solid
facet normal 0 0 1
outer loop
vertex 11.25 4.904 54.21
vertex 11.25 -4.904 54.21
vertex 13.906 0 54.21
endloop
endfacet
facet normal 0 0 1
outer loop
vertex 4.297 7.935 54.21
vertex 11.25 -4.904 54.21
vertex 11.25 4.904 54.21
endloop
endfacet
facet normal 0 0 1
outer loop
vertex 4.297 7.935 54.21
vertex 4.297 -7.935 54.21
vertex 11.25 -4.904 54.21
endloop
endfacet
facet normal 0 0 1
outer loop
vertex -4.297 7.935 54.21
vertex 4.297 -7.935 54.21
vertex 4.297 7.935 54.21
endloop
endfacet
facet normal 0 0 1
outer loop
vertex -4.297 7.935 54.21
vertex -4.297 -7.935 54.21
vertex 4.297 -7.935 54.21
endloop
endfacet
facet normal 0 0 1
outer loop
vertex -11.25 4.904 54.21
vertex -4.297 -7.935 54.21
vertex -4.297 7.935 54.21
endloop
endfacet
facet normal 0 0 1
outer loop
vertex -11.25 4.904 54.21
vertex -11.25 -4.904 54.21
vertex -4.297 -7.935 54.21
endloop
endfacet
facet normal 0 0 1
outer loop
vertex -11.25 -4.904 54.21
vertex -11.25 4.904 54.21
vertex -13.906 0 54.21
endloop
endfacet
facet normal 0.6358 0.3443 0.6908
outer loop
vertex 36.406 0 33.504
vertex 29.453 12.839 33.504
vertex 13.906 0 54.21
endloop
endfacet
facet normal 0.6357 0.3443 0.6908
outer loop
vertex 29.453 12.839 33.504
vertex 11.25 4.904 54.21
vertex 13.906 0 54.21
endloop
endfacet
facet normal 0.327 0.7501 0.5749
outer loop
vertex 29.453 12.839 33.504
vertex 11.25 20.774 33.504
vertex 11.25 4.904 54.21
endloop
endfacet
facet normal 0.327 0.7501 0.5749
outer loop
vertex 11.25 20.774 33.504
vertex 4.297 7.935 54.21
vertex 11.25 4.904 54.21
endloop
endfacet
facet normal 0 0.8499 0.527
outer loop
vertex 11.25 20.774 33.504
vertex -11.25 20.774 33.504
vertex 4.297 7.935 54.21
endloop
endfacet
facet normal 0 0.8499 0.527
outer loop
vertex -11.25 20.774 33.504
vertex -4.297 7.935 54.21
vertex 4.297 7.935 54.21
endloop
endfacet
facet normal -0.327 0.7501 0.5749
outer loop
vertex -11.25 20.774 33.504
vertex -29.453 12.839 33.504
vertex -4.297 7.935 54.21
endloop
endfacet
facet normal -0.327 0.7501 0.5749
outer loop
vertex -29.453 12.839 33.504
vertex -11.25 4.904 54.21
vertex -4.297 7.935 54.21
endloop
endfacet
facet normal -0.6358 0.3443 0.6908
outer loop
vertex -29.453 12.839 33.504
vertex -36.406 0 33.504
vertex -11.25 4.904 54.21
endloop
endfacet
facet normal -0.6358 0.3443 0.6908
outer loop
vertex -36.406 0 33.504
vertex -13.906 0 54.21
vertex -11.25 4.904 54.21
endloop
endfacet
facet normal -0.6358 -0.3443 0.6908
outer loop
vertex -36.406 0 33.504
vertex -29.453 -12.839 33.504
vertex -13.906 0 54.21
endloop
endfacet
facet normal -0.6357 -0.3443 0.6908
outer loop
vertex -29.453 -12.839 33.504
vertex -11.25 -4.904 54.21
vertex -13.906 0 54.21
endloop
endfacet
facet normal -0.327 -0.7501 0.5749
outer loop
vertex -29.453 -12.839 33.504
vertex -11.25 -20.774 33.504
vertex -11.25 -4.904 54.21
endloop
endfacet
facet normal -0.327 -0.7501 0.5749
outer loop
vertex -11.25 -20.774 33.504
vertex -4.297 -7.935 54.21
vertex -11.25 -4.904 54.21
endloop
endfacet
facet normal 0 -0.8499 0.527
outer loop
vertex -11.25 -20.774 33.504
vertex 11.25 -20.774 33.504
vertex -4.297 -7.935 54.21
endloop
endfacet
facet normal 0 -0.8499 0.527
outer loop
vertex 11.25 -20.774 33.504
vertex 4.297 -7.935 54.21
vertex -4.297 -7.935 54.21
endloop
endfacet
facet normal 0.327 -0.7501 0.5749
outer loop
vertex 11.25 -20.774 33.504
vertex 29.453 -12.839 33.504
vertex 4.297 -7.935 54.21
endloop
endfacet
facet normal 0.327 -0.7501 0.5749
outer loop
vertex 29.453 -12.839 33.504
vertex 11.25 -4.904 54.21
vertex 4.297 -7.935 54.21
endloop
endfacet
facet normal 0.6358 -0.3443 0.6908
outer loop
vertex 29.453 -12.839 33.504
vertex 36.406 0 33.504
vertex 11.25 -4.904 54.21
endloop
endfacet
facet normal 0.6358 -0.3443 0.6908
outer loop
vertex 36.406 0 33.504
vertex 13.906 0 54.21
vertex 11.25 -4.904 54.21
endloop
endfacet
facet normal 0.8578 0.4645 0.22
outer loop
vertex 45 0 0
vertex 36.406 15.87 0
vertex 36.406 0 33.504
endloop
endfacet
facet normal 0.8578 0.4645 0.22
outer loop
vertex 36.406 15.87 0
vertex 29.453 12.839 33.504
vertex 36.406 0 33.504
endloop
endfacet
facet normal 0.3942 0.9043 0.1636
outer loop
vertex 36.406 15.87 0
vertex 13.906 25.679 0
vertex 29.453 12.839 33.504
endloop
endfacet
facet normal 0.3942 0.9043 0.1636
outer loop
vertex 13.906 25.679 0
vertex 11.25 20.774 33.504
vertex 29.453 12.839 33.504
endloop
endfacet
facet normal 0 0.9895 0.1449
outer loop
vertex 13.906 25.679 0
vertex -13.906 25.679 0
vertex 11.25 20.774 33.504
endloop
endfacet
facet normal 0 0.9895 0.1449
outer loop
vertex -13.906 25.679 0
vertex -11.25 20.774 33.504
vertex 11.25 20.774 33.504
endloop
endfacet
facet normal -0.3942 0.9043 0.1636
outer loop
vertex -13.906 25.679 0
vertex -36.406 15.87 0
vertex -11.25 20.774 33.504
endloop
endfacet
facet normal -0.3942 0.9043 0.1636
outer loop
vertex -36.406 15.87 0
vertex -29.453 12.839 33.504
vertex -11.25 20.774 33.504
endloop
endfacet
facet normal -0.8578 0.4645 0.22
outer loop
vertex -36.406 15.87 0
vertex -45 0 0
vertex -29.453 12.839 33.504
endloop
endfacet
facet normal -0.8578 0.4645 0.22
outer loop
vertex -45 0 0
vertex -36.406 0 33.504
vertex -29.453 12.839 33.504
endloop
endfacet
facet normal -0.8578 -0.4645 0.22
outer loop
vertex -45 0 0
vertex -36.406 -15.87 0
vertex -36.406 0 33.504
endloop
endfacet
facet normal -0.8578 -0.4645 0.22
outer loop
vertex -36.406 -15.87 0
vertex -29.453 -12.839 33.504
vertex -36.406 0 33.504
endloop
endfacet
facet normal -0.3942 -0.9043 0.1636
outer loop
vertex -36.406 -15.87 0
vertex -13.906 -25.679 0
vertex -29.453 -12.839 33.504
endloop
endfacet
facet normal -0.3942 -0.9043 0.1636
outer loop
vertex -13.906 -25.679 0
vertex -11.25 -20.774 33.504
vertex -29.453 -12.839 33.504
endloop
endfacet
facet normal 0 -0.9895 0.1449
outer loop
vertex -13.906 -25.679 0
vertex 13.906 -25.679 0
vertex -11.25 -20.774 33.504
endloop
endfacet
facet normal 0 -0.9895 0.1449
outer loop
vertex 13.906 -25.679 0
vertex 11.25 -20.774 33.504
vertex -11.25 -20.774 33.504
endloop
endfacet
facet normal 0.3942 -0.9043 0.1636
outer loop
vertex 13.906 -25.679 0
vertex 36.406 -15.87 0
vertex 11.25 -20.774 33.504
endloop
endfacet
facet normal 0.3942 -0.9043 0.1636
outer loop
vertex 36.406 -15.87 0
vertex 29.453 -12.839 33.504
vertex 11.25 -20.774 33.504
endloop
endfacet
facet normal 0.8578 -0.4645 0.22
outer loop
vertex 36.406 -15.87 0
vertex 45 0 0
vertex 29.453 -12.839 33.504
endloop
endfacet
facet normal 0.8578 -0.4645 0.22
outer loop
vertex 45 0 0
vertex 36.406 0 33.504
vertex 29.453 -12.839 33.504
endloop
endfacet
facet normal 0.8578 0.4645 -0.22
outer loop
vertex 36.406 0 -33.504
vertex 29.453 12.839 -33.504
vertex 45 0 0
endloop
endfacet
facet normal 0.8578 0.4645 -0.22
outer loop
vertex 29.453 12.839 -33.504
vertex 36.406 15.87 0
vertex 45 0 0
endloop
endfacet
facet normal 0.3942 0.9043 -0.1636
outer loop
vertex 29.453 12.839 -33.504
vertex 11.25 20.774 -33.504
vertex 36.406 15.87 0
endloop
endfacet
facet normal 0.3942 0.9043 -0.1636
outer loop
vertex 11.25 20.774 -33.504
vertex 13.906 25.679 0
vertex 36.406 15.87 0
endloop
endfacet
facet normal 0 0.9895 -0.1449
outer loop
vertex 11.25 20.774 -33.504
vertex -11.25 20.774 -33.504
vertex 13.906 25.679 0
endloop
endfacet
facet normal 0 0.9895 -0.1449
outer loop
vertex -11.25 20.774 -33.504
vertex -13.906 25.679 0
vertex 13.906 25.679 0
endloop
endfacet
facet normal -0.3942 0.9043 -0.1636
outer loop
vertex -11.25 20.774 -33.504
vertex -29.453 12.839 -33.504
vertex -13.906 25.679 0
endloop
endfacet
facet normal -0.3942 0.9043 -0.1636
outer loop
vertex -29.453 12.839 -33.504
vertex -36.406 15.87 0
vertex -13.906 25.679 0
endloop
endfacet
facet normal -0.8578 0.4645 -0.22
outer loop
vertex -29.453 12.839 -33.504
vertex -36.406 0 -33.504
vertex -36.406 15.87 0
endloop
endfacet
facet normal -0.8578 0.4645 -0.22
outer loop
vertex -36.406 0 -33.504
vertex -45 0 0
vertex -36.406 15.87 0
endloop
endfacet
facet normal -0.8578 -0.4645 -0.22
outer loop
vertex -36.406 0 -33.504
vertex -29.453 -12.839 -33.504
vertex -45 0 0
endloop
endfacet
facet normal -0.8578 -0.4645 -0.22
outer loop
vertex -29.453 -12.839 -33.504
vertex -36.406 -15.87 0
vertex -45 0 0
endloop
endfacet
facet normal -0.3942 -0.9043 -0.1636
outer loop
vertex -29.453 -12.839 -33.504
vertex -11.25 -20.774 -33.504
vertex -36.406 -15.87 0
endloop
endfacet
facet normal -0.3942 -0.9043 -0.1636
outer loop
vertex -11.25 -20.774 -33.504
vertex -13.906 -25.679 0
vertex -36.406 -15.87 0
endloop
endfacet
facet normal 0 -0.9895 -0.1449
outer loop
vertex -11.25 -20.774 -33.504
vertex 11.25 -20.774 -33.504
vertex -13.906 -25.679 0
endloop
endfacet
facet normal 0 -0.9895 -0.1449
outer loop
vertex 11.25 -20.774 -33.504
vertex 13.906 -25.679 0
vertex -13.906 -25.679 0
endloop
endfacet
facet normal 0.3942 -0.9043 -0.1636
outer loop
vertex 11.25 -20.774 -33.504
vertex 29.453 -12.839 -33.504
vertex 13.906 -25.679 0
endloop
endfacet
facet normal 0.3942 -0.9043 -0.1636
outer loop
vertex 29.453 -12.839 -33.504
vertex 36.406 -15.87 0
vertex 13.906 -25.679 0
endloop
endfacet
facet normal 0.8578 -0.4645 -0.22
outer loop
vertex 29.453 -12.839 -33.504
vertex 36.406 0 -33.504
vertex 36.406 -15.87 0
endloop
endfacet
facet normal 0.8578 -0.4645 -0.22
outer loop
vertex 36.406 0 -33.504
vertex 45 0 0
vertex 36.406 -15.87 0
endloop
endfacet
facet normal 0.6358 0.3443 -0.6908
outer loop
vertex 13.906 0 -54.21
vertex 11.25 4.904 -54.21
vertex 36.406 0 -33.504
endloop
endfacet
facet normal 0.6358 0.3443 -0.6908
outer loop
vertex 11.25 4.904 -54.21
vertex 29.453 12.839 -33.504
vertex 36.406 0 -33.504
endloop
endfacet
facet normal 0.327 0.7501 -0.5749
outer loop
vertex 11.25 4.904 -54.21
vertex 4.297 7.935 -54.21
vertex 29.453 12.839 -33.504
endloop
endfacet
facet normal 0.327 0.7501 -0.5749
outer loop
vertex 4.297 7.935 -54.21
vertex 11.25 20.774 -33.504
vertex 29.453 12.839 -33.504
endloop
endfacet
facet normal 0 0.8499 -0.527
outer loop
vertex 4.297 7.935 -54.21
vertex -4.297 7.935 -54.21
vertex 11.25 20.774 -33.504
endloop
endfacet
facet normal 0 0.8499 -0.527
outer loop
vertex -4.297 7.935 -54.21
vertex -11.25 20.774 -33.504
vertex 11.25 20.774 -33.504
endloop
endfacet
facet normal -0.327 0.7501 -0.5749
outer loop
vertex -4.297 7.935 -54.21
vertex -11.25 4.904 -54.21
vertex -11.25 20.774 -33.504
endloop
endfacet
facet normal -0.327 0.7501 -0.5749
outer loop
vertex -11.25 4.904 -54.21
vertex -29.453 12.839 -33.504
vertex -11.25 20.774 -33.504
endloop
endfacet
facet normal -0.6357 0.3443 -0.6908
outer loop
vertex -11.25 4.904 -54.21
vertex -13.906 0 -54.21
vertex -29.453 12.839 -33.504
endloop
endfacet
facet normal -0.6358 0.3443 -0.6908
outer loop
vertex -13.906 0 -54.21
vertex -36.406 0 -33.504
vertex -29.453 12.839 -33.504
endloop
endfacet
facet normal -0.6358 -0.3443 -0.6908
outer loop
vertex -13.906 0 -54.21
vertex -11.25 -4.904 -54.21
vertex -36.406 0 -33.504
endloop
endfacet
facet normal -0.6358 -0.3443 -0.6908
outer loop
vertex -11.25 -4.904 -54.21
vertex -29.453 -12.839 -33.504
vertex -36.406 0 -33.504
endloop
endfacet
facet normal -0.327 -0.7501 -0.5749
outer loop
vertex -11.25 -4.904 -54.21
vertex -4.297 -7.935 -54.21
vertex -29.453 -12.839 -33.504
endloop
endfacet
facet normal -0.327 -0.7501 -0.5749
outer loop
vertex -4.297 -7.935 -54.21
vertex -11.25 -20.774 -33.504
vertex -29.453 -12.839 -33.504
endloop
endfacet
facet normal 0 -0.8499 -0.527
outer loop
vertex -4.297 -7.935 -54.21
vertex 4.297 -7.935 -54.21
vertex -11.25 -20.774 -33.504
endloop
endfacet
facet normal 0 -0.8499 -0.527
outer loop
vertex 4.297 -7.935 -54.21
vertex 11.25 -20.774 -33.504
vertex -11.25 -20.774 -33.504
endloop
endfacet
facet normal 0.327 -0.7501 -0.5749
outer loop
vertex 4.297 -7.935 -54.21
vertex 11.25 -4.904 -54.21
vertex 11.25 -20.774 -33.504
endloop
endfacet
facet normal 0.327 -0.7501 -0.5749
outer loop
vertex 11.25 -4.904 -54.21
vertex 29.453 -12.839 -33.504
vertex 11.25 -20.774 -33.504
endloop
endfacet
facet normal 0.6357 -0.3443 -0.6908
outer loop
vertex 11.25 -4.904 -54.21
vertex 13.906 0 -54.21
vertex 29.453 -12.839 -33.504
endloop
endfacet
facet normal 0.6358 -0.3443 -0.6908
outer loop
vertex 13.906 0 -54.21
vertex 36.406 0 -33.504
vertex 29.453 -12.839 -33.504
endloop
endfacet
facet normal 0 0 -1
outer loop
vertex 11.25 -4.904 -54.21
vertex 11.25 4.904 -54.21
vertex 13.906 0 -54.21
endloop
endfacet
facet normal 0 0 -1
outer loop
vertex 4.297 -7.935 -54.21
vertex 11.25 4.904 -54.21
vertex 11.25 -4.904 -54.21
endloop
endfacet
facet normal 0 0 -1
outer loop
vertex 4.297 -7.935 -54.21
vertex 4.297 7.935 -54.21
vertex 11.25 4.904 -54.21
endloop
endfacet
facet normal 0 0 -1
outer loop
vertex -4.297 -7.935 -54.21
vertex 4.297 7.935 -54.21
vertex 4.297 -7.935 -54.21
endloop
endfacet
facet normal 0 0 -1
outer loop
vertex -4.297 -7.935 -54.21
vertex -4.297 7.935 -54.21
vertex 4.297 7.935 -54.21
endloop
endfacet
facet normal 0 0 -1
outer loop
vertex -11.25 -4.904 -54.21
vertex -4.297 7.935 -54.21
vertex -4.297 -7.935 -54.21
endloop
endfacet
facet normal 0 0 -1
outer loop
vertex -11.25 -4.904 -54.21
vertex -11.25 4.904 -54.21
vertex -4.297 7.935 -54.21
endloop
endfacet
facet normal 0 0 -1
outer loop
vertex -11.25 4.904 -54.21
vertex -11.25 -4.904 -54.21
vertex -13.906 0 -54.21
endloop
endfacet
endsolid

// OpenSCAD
// Generated by SolidPython 1.0.1 on 2020-07-29 00:46:52


scale(v = [15, 9, 19]) {
	sphere(r = 3);
}
/***********************************************
*********      SolidPython code:      **********
************************************************
 
# import packages: SolidPython
from solid import *
from solid.utils import *
from itertools import chain, combinations, permutations


class Resize:

    def __init__(self, scad_file):
        self.scad_file = scad_file
        #self.scad_file = import_scad(scad_file)
        # cone/cylinder param:
        self.r1 = 0
        self.r2 = 0
        self.h = 0
        # rectangular prism param:
        self.w = 0
        self.l = 0
        # ellipse param:
        self.r = 0

    # import OpenScad code (file name corresponds to shape)


    # classify shape + parameters
    def assign(self, param1, param2, param3):
        if self.scad_file == 'cone.scad':
            self.r1 = param1
            self.r2 = param2
            self.h = param3
        elif self.scad_file == 'cylinder.scad':
            self.r1 = param1
            self.r2 = param2
            self.h = param3
        elif self.scad_file == 'rectangularPrism.scad':
            self.h = param1
            self.l = param2
            self.w = param3
        else:
            self.r = param1
            self.h = param2

    # resize parameters
    def iterate(self):
        x = range(3, 20, 2)
        i = 1
        if self.scad_file == 'cone.scad':
            tempList = list(permutations(x, 2))
            for temp in tempList:
                param1 = temp[0]
                param2 = temp[1]
                filepath = 'produced_scad_files/' + 'cone' + str(param1) + '_' + str(param2) + '_' + '.scad'
                scad_render_to_file(cylinder(h=param1, r1=param2, r2=0), filepath)

        elif self.scad_file == 'cylinder.scad':
            tempList = list(permutations(x, 3))
            for temp in tempList:
                param1 = temp[0]
                param2 = temp[1]
                filepath = 'produced_scad_files/' + 'cylinder' + str(param1) + '_' + str(param2) + '_' + '.scad'
                scad_render_to_file(cylinder(h=param1, r1=param2, r2=param2), filepath)

        elif self.scad_file == 'rectangularPrism.scad':
            tempList = list(permutations(x, 3))
            for temp in tempList:
                param1 = temp[0]
                param2 = temp[1]
                param3 = temp[2]
                filepath = 'produced_scad_files/' + 'rectangularPrism' + str(param1) + '_' + str(param2) + '_' + str(
                    param3) + '.scad'
                scad_render_to_file(cube(size=(param1, param2, param3)), filepath)

        elif self.scad_file == 'ellipse.scad':
            tempList = list(permutations(x, 4))
            for temp in tempList:
                param1 = temp[0]
                param2 = temp[1]
                param3 = temp[2]
                param4 = temp[3]
                filepath = 'produced_scad_files/' + 'ellipse' + str(param1) + '_' + str(param2) + '_' + str(param3) + '_' + str(param4) + '.scad'
                scad_render_to_file(scale([param1, param2, param3])(sphere(r=param4)), filepath)

    def render_to_scadfile(self):
        scad_render_to_file(scad, 'example.scad') 
 
************************************************/
